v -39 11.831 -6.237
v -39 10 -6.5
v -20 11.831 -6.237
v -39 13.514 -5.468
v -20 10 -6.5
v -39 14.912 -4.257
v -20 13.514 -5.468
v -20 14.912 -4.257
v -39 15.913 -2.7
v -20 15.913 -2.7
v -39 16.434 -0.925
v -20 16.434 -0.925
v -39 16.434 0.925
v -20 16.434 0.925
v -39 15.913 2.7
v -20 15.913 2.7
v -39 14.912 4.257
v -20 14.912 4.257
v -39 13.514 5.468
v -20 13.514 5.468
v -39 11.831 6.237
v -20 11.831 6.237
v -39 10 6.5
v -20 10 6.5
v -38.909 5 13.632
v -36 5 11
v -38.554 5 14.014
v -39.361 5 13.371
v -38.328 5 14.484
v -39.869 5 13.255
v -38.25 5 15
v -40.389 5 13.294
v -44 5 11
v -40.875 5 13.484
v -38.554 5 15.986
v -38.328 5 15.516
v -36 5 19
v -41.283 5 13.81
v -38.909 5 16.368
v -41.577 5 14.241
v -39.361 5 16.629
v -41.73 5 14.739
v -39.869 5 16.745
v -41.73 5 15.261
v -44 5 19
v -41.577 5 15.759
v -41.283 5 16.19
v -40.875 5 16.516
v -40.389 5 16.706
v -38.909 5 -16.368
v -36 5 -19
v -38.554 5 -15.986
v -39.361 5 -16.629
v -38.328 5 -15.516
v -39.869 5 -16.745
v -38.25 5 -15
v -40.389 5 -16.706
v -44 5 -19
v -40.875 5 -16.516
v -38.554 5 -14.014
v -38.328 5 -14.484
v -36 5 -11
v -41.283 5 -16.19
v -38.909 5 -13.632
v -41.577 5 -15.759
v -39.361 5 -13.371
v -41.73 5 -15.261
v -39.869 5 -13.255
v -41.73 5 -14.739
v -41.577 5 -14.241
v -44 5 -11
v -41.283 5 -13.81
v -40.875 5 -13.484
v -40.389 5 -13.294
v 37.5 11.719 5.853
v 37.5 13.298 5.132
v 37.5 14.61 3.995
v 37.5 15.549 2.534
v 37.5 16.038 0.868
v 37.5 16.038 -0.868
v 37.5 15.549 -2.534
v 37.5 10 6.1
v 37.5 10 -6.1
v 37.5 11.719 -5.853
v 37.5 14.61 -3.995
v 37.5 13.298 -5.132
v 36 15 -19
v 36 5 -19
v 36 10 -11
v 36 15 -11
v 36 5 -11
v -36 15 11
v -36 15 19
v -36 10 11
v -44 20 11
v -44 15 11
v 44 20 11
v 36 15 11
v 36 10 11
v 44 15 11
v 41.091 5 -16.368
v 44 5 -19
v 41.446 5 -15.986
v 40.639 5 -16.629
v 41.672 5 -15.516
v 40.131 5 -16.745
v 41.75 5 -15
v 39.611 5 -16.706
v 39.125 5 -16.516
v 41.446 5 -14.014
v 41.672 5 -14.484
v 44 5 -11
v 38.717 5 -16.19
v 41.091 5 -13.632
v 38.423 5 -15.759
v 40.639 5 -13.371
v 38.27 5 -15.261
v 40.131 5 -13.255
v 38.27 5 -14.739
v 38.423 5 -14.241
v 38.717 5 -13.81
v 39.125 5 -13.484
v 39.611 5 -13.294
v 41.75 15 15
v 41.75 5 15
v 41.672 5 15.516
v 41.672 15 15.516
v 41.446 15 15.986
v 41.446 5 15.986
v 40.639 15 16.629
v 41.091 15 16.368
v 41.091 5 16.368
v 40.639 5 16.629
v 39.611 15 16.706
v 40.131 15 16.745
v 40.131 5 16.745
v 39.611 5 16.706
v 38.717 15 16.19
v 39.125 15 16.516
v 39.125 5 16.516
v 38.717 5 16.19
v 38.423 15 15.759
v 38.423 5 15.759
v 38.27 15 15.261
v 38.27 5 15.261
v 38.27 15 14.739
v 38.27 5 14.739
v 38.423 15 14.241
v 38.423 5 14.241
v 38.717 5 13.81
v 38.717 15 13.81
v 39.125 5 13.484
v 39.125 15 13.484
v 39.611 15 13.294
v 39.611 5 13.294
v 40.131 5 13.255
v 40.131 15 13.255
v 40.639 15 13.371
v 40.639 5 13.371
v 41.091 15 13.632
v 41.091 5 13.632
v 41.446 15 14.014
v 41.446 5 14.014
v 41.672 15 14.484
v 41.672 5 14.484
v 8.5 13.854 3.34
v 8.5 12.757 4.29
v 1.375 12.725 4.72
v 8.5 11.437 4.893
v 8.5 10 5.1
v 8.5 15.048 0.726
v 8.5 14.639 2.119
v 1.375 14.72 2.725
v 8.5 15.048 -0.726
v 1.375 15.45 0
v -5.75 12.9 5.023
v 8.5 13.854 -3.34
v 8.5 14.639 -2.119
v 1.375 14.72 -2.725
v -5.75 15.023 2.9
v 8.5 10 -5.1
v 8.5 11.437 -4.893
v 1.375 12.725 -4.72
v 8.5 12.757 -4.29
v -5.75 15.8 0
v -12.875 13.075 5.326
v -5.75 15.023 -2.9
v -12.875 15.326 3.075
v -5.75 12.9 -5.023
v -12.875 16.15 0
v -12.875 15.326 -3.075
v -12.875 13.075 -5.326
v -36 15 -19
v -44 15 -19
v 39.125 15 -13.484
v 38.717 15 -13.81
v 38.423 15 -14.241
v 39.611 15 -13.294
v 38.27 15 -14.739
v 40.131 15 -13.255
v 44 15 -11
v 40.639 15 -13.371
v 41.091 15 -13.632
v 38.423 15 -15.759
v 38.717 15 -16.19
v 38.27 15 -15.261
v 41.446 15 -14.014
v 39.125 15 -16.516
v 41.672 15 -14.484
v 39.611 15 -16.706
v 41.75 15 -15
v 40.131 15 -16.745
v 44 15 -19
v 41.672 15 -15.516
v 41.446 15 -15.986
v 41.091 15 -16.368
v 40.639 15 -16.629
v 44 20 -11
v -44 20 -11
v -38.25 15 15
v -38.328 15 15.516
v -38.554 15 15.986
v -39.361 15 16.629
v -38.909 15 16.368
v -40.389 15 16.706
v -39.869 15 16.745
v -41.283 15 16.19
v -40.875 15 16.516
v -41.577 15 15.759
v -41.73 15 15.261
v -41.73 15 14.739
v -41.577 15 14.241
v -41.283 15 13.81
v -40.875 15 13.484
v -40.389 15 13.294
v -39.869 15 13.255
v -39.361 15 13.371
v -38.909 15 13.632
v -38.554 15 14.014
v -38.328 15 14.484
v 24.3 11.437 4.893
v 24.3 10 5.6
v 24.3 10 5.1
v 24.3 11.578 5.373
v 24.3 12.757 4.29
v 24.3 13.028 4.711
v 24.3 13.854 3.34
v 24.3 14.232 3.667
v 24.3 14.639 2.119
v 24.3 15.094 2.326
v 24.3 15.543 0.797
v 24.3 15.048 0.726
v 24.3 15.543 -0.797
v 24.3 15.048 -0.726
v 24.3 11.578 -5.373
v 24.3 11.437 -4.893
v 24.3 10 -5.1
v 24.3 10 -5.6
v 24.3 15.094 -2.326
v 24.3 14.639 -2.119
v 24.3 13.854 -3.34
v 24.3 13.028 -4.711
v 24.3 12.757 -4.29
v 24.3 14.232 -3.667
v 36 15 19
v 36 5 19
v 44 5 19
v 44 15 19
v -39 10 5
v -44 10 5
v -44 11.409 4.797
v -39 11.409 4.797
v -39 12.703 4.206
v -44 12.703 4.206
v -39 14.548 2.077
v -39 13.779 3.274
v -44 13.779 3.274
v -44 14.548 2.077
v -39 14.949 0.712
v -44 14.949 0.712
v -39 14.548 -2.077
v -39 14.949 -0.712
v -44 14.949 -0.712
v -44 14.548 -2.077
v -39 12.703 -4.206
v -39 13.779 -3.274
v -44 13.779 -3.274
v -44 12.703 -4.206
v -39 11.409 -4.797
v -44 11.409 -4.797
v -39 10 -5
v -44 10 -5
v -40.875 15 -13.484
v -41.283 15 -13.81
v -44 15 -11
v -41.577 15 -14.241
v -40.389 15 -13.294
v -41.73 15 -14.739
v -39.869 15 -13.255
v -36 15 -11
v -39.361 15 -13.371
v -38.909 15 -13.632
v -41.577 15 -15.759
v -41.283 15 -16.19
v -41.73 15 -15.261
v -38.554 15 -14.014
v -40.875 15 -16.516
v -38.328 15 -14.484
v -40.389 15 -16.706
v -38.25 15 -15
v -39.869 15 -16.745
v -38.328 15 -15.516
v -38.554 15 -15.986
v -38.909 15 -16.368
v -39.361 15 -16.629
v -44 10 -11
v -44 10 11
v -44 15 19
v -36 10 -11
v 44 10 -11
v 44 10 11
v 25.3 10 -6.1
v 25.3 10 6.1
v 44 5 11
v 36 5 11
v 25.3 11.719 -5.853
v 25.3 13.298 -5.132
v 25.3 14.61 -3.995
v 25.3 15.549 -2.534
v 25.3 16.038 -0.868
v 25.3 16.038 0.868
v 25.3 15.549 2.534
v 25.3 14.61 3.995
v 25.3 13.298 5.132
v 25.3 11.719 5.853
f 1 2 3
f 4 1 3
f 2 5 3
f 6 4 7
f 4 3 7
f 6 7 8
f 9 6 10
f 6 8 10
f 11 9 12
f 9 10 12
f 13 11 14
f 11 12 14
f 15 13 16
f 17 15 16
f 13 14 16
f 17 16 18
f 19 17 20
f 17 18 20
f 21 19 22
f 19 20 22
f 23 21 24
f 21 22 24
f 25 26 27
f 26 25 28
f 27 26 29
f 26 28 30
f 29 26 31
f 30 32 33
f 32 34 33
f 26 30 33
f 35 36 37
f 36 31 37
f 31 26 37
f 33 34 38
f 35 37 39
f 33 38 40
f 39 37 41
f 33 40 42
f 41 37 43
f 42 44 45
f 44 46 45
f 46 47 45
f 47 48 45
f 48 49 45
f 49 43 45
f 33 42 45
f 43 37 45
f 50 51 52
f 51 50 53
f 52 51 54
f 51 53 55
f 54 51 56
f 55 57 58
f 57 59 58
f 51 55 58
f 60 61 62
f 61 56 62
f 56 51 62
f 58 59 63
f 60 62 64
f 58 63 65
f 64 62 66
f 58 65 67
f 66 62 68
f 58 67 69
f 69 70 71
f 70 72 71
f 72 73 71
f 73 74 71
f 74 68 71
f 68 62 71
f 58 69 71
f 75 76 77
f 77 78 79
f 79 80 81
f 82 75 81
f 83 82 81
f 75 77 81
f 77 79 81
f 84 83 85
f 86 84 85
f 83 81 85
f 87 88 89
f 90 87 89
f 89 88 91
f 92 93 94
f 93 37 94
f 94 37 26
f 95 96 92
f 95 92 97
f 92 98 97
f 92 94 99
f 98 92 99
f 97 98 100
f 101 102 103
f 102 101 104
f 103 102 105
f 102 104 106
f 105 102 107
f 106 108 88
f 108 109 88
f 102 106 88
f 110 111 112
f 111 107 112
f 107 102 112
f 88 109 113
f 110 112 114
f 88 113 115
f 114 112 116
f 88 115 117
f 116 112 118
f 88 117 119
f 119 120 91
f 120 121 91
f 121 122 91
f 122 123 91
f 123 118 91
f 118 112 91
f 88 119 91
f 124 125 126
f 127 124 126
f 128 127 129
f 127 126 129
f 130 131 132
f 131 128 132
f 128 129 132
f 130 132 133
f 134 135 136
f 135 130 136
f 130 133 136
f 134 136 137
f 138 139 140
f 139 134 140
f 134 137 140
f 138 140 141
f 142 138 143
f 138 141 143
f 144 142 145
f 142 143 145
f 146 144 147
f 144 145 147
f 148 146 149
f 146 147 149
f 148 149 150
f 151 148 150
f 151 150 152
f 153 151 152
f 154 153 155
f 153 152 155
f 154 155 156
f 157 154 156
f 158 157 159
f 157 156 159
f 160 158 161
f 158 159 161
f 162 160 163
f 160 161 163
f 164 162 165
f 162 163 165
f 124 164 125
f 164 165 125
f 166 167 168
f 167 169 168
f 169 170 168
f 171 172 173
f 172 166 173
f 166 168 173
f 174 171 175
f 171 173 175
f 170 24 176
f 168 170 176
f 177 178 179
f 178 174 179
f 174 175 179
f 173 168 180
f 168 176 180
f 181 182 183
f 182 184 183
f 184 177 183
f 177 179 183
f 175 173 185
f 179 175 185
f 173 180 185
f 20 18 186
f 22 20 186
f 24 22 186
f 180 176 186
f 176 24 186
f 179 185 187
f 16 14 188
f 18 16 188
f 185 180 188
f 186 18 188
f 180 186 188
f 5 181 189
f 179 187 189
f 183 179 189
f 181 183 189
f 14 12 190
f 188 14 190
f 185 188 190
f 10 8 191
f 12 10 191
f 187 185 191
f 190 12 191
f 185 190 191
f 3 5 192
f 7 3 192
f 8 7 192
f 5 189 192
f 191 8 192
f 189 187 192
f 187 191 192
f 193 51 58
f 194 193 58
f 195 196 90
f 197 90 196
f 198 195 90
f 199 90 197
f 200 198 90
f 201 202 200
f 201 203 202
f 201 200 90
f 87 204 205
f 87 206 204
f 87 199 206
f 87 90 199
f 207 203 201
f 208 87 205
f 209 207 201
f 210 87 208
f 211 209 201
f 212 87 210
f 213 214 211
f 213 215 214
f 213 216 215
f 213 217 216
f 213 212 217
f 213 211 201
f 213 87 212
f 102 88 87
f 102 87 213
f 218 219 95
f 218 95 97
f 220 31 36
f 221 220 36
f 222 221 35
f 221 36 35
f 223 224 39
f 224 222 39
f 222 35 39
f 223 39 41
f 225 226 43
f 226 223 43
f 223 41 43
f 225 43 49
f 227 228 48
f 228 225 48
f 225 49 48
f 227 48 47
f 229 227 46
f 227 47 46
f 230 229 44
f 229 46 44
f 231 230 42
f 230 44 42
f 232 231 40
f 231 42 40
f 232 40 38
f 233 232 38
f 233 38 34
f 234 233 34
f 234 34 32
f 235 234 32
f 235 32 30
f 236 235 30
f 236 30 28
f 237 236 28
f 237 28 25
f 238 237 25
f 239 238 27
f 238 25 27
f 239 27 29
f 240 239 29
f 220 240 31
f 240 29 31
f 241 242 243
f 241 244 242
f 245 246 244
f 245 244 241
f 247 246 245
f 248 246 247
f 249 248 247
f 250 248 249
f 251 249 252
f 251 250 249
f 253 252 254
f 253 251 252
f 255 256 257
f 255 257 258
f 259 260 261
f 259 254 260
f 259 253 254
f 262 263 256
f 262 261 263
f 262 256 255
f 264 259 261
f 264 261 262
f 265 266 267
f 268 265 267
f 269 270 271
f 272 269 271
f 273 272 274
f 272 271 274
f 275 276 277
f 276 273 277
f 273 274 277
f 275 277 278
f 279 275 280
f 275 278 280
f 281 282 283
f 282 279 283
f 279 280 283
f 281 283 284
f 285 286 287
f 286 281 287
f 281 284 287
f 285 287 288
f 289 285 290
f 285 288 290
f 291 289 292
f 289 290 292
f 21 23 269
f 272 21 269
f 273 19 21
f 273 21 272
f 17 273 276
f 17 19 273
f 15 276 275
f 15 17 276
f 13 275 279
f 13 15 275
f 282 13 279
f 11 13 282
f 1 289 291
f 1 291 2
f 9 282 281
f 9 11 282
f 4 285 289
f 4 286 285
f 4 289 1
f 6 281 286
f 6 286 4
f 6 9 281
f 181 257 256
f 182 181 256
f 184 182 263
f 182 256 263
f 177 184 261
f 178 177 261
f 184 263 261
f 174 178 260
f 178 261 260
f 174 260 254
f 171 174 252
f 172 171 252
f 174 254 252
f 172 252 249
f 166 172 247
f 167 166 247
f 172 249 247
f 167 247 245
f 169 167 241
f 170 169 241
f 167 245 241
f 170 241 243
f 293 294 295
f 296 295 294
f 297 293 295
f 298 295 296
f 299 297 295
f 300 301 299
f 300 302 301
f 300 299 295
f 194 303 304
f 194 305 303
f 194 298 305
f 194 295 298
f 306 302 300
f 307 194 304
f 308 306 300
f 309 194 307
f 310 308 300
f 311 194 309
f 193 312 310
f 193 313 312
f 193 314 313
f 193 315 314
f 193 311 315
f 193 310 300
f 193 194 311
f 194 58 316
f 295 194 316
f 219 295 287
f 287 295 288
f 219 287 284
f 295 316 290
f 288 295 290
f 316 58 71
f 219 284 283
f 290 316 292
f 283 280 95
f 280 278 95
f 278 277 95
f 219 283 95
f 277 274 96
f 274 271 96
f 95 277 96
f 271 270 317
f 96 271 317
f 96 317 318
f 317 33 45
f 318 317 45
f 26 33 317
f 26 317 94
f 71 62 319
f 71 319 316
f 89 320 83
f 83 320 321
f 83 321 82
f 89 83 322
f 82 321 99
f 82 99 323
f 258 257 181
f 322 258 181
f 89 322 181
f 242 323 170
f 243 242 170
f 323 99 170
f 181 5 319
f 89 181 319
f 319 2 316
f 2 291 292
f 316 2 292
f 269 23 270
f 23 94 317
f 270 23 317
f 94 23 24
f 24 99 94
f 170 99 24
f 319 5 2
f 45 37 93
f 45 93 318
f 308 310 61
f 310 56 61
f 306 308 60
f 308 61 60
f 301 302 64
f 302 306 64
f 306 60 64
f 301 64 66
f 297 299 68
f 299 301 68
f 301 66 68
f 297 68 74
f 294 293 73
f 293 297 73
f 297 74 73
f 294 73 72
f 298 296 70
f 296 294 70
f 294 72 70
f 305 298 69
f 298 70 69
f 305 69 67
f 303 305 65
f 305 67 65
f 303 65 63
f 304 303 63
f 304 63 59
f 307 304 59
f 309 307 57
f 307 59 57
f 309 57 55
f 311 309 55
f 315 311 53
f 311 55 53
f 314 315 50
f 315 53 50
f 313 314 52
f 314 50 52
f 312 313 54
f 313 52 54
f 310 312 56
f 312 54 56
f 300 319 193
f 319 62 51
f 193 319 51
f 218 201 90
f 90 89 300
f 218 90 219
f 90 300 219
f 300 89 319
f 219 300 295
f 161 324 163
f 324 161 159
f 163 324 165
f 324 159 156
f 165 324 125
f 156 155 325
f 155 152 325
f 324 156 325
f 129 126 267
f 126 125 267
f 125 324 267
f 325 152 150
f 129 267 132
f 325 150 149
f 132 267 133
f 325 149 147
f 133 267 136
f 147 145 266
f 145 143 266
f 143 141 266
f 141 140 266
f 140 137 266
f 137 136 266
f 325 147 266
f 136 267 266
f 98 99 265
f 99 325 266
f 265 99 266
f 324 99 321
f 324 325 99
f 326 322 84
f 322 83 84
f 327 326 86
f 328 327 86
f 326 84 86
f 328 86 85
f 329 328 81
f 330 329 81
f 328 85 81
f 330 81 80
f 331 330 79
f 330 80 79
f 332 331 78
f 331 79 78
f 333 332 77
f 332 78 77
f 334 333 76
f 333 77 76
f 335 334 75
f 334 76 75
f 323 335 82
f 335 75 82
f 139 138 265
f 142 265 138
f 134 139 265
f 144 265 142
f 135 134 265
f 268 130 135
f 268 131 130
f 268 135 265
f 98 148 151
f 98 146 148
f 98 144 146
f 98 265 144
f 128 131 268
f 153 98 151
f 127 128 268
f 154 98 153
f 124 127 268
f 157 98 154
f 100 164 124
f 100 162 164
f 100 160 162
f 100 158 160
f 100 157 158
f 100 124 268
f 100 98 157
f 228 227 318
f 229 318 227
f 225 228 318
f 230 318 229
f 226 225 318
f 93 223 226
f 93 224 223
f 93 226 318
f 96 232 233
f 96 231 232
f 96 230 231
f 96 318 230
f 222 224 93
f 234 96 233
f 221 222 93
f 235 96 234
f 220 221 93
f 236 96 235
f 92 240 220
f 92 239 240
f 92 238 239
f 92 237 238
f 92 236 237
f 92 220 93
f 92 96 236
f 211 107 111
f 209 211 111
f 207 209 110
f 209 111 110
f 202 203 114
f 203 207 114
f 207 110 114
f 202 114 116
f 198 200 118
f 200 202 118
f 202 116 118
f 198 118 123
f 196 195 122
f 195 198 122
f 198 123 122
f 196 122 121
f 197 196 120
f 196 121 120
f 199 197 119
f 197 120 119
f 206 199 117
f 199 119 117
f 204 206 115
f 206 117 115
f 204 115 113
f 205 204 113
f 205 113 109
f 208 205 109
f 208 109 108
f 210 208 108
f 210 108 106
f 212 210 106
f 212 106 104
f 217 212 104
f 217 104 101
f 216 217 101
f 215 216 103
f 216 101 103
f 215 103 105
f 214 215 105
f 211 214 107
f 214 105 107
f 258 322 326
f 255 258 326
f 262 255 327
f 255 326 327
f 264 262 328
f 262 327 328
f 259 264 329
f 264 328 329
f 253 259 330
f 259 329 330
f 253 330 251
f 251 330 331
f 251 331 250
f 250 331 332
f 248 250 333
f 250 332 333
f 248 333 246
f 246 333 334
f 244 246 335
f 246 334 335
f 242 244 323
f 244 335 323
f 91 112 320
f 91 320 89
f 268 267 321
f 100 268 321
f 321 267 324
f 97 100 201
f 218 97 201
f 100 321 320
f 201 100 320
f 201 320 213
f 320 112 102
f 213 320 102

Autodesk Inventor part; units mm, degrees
ref_plane "YZ Plane" through (0, 0, 0) normal (1, 0, 0) x (0, 1, 0)
ref_plane "XZ Plane" through (0, 0, 0) normal (0, 1, 0) x (-1, 0, 0)
ref_plane "XY Plane" through (0, 0, 0) normal (0, 0, 1) x (1, 0, 0)
sketch "Sketch1" plane through (0, 0, 0) normal (0, 1, 0) x (-1, 0, 0)
  line L0 (44, 11) -> (-44, 11)
  line L1 (-44, 11) -> (-44, -11)
  line L2 (-44, -11) -> (44, -11)
  line L3 (44, -11) -> (44, 11)
  line L4 (44, 11) -> (-44, -11) construction
  line L5 (-44, 11) -> (44, -11) construction
  line L6 (36, 19) -> (44, 19)
  line L7 (44, 19) -> (44, 11)
  line L8 (44, 11) -> (36, 11)
  line L9 (36, 11) -> (36, 19)
  line L10 (36, 19) -> (44, 11) construction
  line L11 (44, 19) -> (36, 11) construction
  line L12 (36, -19) -> (44, -19)
  line L13 (44, -19) -> (44, -11)
  line L14 (44, -11) -> (36, -11)
  line L15 (36, -11) -> (36, -19)
  line L16 (36, -19) -> (44, -11) construction
  line L17 (44, -19) -> (36, -11) construction
  line L18 (-36, 19) -> (-44, 19)
  line L19 (-44, 19) -> (-44, 11)
  line L20 (-44, 11) -> (-36, 11)
  line L21 (-36, 11) -> (-36, 19)
  line L22 (-36, 19) -> (-44, 11) construction
  line L23 (-44, 19) -> (-36, 11) construction
  line L24 (-36, -19) -> (-44, -19)
  line L25 (-44, -19) -> (-44, -11)
  line L26 (-44, -11) -> (-36, -11)
  line L27 (-36, -11) -> (-36, -19)
  line L28 (-36, -19) -> (-44, -11) construction
  line L29 (-44, -19) -> (-36, -11) construction
  circle A0 centre (40, 15) radius 1.75
  circle A1 centre (40, -15) radius 1.75
  circle A2 centre (-40, 15) radius 1.75
  circle A3 centre (-40, -15) radius 1.75
  point P0 (0, 0)
  dimension "d0" = 22
  dimension "d1" = 88
  dimension "d2" = 8
  dimension "d3" = 8
  dimension "d8" = 3.5
  dimension "d9" = 3.5
  dimension "d10" = 3.5
  dimension "d11" = 3.5
  dimension "d24" = 30
  dimension "d25" = 80
extrude "Extrusion1" add sketch "Sketch1" along normal blind 10 contours L3 L2 L1 L0
extrude "Extrusion2" add sketch "Sketch1" along normal blind 5 contours L0 L9 L6 L7 | L13 L12 L15 L2 | L0 L19 L18 L21 | L27 L24 L25 L2
sketch "Sketch3" plane through (0, 10, 0) normal (0, 1, 0) x (1, 0, 0)
  line L0 (44, 11) -> (44, 19) projected
  line L1 (-44, -11) -> (44, -11)
  line L2 (44, -11) -> (44, 11)
  line L3 (44, 11) -> (-44, 11)
  line L4 (-44, 11) -> (-44, -11)
  line L5 (-44, -11) -> (44, 11) construction
  line L6 (44, -11) -> (-44, 11) construction
  line L7 (-36, -19) -> (-36, -11) projected
  line L8 (-44, -11) -> (-36, -11) projected
  line L9 (-44, -11) -> (-44, -19) projected
  line L10 (-44, -19) -> (-36, -19) projected
  circle A0 centre (-40, -15) radius 1.75 projected
  line L11 (-36, 11) -> (-44, 11) projected
  line L12 (-36, 11) -> (-36, 19) projected
  line L13 (-36, 19) -> (-44, 19) projected
  line L14 (-44, 19) -> (-44, 11) projected
  circle A1 centre (-40, 15) radius 1.75 projected
  line L15 (36, 19) -> (36, 11) projected
  line L16 (44, 11) -> (36, 11) projected
  line L17 (44, 11) -> (44, 19) projected
  line L18 (44, 19) -> (36, 19) projected
  circle A2 centre (40, 15) radius 1.75 projected
  line L19 (36, -11) -> (44, -11) projected
  line L20 (36, -11) -> (36, -19) projected
  line L21 (36, -19) -> (44, -19) projected
  line L22 (44, -19) -> (44, -11) projected
  circle A3 centre (40, -15) radius 1.75 projected
  point P0 (0, 0)
extrude "Extrusion3" add sketch "Sketch3" along normal blind 10 contours L2 L1 L4 L3
extrude "Extrusion4" add sketch "Sketch3" along normal mid plane 10 contours L3 L15 L18 L0 | L22 L21 L20 L1 | L3 L14 L13 L12 | L7 L10 L9 L1
sketch "Sketch2" plane through (0, 10, 0) normal (0, 1, 0) x (1, 0, 0)
  line L0 (-98.02, 0) -> (97.5, 0)
  line L1 (-39, 5) -> (-39, 6.5)
  line L2 (-39, 6.5) -> (-20, 6.5)
  line L3 (-20, 6.5) -> (8.5, 5.1)
  line L4 (8.5, 5.1) -> (24.3, 5.1)
  line L5 (24.3, 5.1) -> (24.3, 5.6)
  line L6 (24.3, 5.6) -> (25.3, 6.1)
  line L7 (25.3, 6.1) -> (37.5, 6.1)
  line L8 (37.5, 6.1) -> (37.5, 0)
  line L9 (-38.5, 0) -> (37.5, 0)
  line L10 (-44, 11) -> (-44, -11) projected
  line L11 (-39, 5) -> (-44, 5)
  line L12 (-44, 5) -> (-44, 0)
  point P0 (0, 0)
  dimension "d12" = 13
  dimension "d13" = 12.2
  dimension "d14" = 1
  dimension "d15" = 0.5
  dimension "d16" = 10.2
  dimension "d17" = 76.5
  dimension "d18" = 13.2
  dimension "d19" = 19
  dimension "d20" = 5
  dimension "d21" = 29
  dimension "d23" = 10
revolve "Revolution1" cut sketch "Sketch2" angle 360 about axis through (-98.02, 10, 0) along (1, 0, 0)
extrude "Extrusion6" cut sketch "Sketch1" along normal blind 10 contours L3 L2 L1 L0
extrude "Extrusion7" cut sketch "Sketch1" along normal blind 5 contours L3 L2 L1 L0 | L0 L9 L6 L7 | L13 L12 L15 L2 | L0 L19 L18 L21 | L27 L24 L25 L2 | A1 | A2
equation "\"d9\" = d8"
equation "\"d10\" = d8"
equation "\"d11\" = d8"
properties part number "stick_antenna__case_cap"
